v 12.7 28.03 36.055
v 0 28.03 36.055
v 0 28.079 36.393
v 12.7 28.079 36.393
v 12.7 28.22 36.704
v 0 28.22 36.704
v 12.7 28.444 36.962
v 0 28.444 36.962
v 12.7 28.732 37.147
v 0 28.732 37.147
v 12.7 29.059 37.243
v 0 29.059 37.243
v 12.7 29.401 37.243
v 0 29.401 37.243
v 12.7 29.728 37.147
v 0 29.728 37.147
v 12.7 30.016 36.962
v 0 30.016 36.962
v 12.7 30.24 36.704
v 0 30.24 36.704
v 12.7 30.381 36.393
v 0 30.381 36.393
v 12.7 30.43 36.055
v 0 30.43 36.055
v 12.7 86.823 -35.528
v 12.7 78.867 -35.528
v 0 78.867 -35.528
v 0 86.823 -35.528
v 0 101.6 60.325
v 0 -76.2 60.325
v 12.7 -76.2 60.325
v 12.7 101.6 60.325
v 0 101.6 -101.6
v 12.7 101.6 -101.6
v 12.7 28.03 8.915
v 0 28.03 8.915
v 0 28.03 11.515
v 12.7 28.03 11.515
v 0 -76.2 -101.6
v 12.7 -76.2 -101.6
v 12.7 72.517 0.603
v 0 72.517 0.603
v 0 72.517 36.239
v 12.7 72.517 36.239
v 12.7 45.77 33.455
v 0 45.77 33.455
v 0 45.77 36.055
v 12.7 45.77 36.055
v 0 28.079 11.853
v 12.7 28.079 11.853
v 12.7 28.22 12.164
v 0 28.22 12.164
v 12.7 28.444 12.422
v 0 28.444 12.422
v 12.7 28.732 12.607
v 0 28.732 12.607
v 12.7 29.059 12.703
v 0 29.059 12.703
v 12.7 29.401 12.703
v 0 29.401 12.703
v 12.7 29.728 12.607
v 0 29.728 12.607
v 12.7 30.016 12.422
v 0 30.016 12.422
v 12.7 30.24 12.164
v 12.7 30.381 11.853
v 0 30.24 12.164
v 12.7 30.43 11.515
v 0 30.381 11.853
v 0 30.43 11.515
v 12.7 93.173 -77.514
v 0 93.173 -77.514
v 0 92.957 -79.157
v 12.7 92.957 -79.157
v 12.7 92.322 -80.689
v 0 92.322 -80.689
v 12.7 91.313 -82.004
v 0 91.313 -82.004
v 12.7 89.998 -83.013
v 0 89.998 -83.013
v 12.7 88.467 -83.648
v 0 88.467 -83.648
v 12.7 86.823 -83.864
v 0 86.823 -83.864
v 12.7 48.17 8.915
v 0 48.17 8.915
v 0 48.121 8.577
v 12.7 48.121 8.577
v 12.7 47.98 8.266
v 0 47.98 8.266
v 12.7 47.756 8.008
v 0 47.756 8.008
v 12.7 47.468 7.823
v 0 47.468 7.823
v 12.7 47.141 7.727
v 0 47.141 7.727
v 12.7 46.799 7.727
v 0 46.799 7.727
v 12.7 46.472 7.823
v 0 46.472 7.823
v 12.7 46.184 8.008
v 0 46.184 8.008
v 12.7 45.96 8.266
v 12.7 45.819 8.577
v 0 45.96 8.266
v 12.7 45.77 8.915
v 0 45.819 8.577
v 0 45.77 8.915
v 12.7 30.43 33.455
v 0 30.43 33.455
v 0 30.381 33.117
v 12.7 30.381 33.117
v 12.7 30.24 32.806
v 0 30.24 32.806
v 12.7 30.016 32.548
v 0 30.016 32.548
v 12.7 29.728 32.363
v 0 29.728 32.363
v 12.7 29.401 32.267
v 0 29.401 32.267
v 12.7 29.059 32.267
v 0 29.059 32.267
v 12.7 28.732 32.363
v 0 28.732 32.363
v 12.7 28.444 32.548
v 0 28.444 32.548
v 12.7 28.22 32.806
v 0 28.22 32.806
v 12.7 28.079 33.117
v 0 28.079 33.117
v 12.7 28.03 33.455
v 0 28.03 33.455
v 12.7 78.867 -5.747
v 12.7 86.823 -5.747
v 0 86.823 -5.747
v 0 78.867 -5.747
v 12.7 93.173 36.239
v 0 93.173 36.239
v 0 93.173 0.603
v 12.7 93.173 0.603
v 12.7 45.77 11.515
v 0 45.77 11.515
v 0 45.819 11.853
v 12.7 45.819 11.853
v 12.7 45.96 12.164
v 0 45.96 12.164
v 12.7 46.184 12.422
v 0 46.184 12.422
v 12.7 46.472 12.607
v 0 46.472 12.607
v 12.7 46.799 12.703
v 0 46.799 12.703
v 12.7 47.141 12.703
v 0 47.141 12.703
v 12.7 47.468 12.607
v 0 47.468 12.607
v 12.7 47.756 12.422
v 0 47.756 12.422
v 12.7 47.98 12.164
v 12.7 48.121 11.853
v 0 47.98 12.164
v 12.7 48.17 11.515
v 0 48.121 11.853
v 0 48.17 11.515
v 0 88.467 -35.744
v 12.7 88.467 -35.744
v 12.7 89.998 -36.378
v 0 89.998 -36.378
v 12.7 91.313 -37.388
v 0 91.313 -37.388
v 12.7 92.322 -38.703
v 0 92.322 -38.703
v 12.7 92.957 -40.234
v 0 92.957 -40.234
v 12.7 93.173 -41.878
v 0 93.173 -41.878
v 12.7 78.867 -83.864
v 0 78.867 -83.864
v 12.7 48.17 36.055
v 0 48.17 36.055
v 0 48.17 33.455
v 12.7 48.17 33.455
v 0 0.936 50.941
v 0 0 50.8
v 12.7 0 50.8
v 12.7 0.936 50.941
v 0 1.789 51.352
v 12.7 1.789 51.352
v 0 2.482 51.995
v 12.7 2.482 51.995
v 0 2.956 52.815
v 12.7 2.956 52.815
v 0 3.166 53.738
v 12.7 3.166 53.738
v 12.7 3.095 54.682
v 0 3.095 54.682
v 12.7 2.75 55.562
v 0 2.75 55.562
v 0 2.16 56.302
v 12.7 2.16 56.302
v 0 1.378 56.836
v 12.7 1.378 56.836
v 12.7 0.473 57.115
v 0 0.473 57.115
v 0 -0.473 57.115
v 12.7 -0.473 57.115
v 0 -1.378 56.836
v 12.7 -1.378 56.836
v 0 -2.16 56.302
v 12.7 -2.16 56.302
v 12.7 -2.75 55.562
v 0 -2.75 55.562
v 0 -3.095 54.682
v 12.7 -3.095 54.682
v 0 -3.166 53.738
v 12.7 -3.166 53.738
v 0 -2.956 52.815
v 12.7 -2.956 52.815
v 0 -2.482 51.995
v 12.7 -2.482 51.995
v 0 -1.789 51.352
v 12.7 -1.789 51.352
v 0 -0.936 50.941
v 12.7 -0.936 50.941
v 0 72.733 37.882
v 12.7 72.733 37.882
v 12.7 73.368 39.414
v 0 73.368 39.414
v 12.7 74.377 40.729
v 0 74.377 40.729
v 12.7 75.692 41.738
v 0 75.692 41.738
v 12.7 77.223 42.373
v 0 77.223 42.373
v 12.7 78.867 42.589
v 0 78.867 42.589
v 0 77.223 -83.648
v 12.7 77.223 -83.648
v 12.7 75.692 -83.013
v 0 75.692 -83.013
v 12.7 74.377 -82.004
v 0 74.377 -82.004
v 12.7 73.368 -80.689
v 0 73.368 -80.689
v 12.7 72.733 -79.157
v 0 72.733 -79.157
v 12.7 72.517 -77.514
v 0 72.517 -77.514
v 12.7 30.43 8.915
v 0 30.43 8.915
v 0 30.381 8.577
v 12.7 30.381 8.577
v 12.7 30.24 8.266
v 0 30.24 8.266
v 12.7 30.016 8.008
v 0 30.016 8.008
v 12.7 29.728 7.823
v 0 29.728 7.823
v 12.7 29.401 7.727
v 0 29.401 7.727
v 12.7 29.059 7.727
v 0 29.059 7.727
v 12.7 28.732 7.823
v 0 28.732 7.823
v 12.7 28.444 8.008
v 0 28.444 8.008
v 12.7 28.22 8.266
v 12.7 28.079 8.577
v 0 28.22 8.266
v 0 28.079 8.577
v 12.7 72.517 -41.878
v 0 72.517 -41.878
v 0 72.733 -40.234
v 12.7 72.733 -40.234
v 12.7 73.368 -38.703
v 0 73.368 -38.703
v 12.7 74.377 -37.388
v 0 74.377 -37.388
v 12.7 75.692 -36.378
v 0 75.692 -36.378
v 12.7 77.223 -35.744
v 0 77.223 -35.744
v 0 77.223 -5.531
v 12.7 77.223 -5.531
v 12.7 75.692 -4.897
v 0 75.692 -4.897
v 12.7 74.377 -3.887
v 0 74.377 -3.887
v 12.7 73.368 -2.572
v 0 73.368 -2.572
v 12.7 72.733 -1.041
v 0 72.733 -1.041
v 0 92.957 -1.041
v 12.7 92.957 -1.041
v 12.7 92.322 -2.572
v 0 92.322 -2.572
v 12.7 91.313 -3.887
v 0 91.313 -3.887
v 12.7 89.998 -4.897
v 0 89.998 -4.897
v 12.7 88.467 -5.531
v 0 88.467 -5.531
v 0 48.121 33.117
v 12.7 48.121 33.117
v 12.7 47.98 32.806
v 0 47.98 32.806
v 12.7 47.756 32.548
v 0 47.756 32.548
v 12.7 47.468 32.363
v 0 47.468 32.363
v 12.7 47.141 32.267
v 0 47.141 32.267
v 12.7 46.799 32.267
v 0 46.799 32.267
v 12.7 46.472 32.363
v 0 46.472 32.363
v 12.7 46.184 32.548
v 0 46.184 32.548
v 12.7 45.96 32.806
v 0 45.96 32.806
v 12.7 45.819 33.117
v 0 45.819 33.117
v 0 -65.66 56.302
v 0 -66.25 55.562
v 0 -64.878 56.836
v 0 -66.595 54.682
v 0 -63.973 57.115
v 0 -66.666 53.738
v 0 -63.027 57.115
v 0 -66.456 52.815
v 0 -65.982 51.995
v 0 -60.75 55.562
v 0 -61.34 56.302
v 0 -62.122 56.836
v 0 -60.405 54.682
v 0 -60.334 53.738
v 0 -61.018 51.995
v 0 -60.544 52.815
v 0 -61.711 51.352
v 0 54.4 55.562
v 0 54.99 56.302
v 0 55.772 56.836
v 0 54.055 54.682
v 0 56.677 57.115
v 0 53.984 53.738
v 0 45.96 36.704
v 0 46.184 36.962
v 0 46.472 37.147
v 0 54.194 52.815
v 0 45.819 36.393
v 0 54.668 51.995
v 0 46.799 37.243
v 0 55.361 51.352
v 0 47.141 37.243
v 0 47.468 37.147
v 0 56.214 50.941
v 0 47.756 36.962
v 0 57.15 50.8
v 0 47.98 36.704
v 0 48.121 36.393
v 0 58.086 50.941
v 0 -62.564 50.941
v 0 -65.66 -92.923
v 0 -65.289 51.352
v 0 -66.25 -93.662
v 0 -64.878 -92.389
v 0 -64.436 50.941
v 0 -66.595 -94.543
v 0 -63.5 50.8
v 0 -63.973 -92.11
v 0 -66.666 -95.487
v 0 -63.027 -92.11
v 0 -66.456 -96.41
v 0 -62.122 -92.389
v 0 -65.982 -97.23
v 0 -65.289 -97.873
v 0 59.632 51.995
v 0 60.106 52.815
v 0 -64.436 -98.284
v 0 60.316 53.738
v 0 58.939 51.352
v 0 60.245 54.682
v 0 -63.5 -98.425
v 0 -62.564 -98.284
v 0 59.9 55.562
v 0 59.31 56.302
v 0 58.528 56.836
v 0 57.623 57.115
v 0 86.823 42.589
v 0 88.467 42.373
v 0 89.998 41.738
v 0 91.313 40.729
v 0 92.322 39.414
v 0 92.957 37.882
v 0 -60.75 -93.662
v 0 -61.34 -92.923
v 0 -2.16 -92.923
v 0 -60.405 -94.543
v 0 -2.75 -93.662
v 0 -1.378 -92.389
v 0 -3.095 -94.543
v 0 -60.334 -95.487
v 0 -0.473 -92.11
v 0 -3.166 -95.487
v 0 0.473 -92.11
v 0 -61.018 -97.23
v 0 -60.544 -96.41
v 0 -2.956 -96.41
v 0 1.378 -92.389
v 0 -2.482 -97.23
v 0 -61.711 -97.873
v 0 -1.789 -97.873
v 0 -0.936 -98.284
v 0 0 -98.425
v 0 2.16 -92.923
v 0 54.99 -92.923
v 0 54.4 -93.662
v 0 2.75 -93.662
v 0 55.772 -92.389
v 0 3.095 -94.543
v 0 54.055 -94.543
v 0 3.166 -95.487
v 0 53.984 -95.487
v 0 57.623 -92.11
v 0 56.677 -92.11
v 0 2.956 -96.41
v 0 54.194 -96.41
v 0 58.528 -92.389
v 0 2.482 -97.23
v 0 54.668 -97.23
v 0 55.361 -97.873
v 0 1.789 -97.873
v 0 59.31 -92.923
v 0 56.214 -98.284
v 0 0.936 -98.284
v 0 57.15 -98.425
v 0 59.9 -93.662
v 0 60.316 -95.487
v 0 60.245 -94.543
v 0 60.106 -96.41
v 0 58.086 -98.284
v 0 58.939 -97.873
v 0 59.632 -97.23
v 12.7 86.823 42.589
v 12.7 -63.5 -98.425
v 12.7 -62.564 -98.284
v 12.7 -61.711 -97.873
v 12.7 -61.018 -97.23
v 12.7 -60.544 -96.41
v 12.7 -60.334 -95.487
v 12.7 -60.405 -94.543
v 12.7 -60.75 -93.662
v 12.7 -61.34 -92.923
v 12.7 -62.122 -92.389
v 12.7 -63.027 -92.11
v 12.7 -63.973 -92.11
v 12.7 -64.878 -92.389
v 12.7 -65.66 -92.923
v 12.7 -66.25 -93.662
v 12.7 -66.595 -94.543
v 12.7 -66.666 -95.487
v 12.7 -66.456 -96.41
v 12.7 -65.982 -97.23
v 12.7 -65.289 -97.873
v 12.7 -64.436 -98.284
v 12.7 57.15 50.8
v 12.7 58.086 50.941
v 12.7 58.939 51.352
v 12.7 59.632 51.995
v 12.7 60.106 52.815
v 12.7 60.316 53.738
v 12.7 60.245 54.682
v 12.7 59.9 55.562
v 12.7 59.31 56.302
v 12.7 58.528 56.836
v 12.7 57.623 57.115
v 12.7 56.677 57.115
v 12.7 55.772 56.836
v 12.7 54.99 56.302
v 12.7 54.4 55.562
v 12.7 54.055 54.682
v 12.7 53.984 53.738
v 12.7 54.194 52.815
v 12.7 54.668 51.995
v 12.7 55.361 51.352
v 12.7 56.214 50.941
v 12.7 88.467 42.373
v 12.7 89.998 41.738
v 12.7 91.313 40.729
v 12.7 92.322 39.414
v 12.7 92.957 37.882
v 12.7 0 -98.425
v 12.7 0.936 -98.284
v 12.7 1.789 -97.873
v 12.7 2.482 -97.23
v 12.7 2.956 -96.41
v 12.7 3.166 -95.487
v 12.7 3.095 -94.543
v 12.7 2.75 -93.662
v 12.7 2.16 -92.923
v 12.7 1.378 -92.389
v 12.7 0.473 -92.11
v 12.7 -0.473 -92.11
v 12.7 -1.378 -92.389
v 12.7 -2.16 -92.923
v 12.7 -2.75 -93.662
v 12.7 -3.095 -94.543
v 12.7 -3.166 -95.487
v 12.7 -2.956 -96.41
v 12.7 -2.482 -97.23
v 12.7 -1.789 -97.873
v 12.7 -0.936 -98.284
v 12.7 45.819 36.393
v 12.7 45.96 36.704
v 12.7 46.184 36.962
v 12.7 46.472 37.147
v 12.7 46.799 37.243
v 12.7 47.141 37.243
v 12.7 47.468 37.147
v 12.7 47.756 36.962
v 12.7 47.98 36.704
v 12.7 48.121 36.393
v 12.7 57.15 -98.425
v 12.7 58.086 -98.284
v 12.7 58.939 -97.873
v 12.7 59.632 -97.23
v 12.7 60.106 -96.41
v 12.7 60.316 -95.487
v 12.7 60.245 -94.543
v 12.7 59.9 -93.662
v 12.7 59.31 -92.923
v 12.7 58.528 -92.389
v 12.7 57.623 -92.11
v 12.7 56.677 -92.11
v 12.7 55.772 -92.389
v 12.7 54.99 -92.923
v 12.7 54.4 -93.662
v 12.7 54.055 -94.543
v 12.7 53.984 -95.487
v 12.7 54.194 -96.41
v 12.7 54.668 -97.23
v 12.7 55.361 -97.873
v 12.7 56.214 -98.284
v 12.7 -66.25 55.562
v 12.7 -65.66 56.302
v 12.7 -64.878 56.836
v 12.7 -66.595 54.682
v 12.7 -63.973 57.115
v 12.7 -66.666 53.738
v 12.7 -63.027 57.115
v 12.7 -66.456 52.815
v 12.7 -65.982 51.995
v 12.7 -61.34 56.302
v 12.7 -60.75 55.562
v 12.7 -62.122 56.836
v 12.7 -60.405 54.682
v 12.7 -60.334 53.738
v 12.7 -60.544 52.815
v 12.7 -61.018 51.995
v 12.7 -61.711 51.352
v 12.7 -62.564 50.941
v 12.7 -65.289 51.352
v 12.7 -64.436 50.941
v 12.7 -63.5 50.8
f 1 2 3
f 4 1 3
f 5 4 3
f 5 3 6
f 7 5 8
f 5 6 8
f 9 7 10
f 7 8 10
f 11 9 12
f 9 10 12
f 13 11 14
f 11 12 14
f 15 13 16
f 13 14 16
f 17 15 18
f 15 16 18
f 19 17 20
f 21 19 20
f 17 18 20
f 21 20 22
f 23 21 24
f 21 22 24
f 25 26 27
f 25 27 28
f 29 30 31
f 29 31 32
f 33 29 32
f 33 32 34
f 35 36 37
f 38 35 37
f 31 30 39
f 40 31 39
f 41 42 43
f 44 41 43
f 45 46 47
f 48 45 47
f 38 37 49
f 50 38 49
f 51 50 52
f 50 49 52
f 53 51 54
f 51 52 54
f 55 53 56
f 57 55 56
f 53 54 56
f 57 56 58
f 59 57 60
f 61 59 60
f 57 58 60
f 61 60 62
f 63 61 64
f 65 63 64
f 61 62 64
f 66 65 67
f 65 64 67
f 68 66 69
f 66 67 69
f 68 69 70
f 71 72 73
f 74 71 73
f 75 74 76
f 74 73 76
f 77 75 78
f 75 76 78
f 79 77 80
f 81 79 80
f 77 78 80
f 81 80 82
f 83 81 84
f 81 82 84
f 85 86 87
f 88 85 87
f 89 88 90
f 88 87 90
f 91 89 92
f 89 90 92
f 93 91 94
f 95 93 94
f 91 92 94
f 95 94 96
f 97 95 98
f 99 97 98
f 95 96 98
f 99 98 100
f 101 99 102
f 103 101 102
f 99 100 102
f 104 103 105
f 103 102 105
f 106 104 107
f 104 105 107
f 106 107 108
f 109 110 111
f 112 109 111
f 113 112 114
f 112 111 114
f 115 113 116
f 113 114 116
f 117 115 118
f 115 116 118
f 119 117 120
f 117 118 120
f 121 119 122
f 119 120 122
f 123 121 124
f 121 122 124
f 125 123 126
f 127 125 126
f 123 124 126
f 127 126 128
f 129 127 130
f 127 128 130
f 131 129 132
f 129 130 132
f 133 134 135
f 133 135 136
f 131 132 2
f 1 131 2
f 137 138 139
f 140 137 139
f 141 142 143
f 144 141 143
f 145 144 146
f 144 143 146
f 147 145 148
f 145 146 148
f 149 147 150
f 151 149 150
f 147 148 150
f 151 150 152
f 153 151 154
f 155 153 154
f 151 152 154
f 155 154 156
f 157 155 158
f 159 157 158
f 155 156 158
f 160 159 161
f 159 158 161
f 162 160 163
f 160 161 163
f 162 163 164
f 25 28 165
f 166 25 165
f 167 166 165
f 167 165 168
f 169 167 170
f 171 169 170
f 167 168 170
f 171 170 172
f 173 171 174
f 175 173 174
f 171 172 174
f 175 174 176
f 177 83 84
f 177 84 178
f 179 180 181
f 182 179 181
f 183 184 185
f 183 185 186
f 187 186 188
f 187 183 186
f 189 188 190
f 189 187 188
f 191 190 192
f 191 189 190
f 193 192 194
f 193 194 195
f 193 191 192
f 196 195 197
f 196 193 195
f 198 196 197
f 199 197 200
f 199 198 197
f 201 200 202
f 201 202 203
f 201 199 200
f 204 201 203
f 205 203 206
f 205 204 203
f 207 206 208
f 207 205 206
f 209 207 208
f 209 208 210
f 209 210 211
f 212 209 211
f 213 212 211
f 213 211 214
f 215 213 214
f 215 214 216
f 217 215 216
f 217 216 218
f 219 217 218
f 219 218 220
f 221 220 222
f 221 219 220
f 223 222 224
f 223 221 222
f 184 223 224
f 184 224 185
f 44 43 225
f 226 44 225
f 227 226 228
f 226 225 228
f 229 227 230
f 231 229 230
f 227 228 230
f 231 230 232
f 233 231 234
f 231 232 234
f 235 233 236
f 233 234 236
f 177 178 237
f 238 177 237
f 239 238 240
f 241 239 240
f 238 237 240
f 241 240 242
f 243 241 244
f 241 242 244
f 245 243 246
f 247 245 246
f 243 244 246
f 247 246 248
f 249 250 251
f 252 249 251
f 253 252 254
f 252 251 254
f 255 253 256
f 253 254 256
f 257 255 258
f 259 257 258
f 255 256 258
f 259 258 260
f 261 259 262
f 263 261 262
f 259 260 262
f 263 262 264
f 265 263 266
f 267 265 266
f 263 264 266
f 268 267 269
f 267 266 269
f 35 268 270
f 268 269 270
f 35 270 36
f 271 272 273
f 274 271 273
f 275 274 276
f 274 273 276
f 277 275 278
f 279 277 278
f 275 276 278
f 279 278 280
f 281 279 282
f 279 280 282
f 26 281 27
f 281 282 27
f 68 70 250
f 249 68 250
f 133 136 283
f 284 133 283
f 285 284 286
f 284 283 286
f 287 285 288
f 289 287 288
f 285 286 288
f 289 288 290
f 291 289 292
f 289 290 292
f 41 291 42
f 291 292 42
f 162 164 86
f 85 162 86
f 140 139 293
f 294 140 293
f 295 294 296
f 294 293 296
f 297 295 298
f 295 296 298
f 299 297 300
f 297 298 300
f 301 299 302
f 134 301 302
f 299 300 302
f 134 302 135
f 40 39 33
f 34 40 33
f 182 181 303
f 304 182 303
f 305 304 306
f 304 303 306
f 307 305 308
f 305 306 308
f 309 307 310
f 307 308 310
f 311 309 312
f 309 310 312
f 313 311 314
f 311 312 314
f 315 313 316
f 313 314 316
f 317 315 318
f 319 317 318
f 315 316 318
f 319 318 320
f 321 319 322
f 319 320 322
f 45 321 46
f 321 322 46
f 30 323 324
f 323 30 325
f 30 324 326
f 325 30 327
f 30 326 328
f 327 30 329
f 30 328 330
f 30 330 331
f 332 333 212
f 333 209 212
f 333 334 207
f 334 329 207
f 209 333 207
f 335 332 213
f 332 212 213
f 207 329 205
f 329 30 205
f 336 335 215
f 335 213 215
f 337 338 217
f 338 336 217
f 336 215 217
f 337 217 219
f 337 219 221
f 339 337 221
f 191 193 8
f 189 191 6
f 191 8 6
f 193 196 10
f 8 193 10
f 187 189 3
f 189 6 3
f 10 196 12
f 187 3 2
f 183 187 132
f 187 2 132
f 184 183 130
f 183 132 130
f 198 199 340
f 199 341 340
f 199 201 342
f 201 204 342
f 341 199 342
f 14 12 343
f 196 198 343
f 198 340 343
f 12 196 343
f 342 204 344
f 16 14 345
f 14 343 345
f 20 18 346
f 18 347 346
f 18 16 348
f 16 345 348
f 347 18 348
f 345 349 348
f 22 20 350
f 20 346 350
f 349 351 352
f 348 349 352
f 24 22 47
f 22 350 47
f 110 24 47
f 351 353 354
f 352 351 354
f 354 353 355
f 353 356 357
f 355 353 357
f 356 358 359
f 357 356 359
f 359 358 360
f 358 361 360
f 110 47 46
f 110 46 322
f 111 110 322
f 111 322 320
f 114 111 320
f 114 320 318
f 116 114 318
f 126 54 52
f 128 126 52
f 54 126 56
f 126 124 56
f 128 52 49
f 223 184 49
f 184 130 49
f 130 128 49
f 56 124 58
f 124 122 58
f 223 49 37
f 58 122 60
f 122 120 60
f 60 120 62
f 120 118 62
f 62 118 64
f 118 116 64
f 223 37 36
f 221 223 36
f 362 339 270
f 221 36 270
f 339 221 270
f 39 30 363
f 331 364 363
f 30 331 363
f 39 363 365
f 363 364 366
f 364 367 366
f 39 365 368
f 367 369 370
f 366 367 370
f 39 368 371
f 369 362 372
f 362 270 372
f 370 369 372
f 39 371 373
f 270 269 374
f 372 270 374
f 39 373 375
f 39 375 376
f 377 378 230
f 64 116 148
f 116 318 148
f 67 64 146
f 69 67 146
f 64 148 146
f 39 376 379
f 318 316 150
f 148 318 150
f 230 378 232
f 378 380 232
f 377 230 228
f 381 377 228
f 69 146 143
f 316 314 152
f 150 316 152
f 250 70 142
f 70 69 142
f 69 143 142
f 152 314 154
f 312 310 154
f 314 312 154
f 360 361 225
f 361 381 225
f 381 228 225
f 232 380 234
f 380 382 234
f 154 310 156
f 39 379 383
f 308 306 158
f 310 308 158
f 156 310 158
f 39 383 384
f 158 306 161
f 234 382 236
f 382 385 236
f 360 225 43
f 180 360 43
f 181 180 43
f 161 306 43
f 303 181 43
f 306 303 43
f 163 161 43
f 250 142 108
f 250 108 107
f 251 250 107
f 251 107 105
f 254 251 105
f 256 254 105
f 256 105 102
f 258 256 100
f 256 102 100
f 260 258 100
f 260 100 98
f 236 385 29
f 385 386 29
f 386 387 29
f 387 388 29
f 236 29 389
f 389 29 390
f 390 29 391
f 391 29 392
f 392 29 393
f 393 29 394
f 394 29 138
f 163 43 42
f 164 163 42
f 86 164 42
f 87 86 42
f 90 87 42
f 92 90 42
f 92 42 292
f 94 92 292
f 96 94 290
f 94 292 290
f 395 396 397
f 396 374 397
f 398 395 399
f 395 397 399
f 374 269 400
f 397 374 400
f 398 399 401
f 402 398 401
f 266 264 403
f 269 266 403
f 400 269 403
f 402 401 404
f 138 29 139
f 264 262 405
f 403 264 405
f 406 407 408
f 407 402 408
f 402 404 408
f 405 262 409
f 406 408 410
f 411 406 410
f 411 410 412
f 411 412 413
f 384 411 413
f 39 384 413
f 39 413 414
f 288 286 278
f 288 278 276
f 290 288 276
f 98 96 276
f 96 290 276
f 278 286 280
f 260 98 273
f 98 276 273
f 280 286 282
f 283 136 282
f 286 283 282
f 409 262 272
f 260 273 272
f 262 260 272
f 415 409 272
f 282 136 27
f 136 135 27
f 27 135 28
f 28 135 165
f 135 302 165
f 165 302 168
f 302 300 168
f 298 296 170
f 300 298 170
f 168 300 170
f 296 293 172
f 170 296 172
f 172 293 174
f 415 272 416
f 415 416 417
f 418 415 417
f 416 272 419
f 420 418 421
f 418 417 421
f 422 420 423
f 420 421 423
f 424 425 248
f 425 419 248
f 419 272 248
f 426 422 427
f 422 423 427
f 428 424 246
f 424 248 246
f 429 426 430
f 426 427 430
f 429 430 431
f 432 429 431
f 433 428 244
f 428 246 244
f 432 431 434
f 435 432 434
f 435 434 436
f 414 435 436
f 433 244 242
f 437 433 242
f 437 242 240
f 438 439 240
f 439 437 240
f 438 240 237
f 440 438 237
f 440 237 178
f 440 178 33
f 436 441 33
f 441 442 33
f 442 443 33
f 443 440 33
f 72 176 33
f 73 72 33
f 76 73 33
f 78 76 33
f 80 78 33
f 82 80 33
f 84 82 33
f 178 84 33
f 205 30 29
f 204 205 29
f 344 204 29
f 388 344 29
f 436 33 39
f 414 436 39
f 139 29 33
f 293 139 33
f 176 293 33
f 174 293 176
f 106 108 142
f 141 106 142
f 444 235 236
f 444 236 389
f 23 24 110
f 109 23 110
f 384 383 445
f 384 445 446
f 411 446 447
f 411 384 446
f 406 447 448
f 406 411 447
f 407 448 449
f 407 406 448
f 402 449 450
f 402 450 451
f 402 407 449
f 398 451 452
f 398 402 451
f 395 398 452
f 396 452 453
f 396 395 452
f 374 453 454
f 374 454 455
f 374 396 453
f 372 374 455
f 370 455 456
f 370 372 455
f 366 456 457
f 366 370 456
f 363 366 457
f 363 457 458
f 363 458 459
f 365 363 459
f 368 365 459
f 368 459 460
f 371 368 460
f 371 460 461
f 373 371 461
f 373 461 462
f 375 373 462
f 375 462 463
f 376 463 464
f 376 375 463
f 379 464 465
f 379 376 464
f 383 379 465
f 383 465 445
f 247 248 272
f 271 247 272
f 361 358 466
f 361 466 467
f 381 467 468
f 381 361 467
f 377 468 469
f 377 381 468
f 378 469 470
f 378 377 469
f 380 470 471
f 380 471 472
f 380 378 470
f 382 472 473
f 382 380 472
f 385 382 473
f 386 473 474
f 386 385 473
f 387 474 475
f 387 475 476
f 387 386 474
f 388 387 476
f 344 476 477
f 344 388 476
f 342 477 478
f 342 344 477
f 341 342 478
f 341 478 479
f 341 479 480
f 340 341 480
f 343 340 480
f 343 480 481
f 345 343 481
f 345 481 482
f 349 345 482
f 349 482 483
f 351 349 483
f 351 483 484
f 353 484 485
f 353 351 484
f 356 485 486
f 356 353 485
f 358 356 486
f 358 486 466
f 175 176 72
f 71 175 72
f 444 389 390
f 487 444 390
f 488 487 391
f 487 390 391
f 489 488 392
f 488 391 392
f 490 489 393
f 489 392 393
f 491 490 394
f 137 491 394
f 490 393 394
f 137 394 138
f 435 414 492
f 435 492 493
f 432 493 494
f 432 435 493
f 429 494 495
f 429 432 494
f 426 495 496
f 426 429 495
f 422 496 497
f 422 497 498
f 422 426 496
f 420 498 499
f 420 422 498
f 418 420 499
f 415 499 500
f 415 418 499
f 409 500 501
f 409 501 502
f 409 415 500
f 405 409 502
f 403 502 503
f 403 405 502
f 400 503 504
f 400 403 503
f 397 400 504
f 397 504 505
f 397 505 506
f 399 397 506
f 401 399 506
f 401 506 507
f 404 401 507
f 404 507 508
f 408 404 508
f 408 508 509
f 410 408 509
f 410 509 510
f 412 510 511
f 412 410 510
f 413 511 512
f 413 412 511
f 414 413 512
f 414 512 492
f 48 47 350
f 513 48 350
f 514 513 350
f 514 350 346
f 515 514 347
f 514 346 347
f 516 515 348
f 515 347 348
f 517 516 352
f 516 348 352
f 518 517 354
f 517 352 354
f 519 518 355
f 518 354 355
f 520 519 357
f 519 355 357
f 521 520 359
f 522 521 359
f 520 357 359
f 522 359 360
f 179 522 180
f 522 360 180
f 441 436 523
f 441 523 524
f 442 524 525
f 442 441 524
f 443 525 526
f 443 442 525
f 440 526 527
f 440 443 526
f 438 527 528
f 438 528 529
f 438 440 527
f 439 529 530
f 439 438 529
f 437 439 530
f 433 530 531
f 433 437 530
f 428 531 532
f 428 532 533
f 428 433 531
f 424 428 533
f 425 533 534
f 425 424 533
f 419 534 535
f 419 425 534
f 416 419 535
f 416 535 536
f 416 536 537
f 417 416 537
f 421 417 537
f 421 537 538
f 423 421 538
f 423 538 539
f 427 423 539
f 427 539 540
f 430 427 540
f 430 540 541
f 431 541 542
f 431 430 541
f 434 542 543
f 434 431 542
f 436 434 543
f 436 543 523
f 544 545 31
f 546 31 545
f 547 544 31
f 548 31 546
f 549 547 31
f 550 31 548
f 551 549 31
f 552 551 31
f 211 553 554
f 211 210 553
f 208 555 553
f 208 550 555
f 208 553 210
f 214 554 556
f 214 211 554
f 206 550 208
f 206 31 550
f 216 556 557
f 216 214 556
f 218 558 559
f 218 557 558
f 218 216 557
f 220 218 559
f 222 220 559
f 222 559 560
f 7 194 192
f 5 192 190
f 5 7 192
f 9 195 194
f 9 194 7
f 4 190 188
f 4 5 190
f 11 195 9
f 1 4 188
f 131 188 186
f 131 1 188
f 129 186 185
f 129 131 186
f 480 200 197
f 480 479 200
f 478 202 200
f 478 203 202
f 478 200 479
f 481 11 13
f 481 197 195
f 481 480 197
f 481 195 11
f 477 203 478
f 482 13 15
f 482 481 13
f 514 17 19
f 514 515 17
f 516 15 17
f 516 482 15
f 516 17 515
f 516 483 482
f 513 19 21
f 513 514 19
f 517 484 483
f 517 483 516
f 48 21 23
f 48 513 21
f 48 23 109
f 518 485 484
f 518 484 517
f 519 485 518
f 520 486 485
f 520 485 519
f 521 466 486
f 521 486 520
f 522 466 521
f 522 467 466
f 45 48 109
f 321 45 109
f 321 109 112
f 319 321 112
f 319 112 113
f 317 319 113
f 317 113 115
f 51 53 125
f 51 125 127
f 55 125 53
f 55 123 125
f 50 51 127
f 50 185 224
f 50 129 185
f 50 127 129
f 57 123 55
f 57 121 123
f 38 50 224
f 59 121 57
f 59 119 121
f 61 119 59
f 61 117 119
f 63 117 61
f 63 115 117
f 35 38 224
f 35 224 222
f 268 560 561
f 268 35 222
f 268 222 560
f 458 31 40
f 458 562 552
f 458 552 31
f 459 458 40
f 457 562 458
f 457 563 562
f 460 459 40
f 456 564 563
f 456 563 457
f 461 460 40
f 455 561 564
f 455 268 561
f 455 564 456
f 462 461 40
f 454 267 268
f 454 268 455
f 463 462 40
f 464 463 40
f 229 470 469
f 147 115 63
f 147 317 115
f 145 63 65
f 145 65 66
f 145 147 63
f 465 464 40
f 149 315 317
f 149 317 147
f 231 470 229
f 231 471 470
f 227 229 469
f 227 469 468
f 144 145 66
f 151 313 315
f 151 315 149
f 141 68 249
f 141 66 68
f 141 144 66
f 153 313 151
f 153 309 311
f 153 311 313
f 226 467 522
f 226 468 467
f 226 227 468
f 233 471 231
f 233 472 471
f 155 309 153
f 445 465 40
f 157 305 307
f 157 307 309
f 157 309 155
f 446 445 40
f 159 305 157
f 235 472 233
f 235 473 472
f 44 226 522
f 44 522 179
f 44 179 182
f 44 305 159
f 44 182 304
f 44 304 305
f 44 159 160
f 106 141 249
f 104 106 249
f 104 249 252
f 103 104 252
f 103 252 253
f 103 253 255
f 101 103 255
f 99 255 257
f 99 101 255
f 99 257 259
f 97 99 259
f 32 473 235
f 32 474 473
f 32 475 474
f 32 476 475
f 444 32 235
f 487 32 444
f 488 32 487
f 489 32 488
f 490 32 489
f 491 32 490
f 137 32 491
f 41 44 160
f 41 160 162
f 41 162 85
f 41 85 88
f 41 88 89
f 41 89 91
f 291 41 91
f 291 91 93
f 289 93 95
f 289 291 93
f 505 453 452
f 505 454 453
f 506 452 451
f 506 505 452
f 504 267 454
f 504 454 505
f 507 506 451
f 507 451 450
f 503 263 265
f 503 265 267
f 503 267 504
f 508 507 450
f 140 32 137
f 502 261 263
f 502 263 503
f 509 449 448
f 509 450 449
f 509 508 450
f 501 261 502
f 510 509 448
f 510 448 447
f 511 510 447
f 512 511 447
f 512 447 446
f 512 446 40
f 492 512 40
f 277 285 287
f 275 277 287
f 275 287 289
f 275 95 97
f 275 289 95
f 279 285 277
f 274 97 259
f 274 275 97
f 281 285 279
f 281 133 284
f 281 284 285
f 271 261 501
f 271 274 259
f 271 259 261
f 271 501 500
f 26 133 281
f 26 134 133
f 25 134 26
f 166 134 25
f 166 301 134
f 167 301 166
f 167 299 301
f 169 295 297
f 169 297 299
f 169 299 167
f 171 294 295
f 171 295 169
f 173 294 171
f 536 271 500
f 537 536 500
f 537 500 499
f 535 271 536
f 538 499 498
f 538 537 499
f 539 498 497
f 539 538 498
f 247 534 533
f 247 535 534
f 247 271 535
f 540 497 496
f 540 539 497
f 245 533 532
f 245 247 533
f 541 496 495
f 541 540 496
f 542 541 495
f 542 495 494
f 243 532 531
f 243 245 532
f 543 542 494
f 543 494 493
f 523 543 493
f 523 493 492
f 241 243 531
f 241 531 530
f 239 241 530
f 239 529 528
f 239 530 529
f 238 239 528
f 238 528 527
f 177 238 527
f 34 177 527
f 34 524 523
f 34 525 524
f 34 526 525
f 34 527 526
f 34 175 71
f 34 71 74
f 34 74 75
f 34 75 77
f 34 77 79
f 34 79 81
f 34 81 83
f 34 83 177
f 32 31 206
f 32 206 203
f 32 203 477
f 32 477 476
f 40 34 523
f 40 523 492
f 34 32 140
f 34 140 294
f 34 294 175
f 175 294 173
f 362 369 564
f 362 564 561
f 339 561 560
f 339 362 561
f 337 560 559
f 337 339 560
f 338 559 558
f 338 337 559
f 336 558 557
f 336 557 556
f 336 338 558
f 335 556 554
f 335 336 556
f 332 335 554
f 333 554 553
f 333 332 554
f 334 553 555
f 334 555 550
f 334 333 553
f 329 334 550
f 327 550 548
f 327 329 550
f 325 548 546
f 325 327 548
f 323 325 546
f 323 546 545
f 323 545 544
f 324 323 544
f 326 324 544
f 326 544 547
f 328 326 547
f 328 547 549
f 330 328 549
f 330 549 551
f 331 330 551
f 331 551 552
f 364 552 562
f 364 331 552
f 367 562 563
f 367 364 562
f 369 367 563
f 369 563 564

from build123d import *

# Parameters (mm, degrees)
SKETCH1_W           = 161.925
SKETCH1_H           = 177.8
SKETCH1_R           = 3.175
BOSS_EXTRUDE1_DEPTH = 12.7


with BuildPart() as part:
    # Sketch1 → Boss-Extrude1 (new body)
    with BuildSketch(Plane(origin=(0, 0, 0), x_dir=(0, 0, -1), z_dir=(1, 0, 0))):
        with Locations((20.6375, 12.7)):
            Rectangle(SKETCH1_W, SKETCH1_H)
        with Locations((-53.975, -63.5)):
            Circle(SKETCH1_R, mode=Mode.SUBTRACT)
        with Locations((-53.975, 0)):
            Circle(SKETCH1_R, mode=Mode.SUBTRACT)
        with Locations((95.25, -63.5)):
            Circle(SKETCH1_R, mode=Mode.SUBTRACT)
        with Locations((95.25, 0)):
            Circle(SKETCH1_R, mode=Mode.SUBTRACT)
        with BuildLine():
            ThreePointArc((-33.455, 30.43), (-32.255, 29.23), (-33.455, 28.03))
            Line((-33.455, 28.03), (-36.055, 28.03))
            ThreePointArc((-36.055, 28.03), (-37.255, 29.23), (-36.055, 30.43))
            Line((-36.055, 30.43), (-33.455, 30.43))
        make_face(mode=Mode.SUBTRACT)
        with BuildLine():
            Line((-36.055, 48.17), (-33.455, 48.17))
            ThreePointArc((-33.455, 48.17), (-32.255, 46.97), (-33.455, 45.77))
            Line((-33.455, 45.77), (-36.055, 45.77))
            ThreePointArc((-36.055, 45.77), (-37.255, 46.97), (-36.055, 48.17))
        make_face(mode=Mode.SUBTRACT)
        with BuildLine():
            ThreePointArc((-8.915, 30.43), (-7.715, 29.23), (-8.915, 28.03))
            Line((-8.915, 28.03), (-11.515, 28.03))
            ThreePointArc((-11.515, 28.03), (-12.715, 29.23), (-11.515, 30.43))
            Line((-11.515, 30.43), (-8.915, 30.43))
        make_face(mode=Mode.SUBTRACT)
        with Locations((-53.975, 57.15)):
            Circle(SKETCH1_R, mode=Mode.SUBTRACT)
        with BuildLine():
            Line((-42.588896299, 78.866901715), (-42.588896299, 86.823202123))
            ThreePointArc((-42.588896299, 86.823202123), (-40.729024359, 91.313330183), (-36.238896299, 93.173202123))
            Line((-36.238896299, 93.173202123), (-0.602666303, 93.173202123))
            ThreePointArc((-0.602666303, 93.173202123), (3.887461758, 91.313330183), (5.747333697, 86.823202123))
            Line((5.747333697, 86.823202123), (5.747333697, 78.866901715))
            ThreePointArc((5.747333697, 78.866901715), (3.887461758, 74.376773654), (-0.602666303, 72.516901715))
            Line((-0.602666303, 72.516901715), (-36.238896299, 72.516901715))
            ThreePointArc((-36.238896299, 72.516901715), (-40.729024359, 74.376773654), (-42.588896299, 78.866901715))
        make_face(mode=Mode.SUBTRACT)
        with Locations((95.25, 57.15)):
            Circle(SKETCH1_R, mode=Mode.SUBTRACT)
        with BuildLine():
            ThreePointArc((41.877666303, 72.516901715), (37.387538242, 74.376773654), (35.527666303, 78.866901715))
            Line((35.527666303, 78.866901715), (35.527666303, 86.823202123))
            ThreePointArc((35.527666303, 86.823202123), (37.387538242, 91.313330183), (41.877666303, 93.173202123))
            Line((41.877666303, 93.173202123), (77.513896299, 93.173202123))
            ThreePointArc((77.513896299, 93.173202123), (82.004024359, 91.313330183), (83.863896299, 86.823202123))
            Line((83.863896299, 86.823202123), (83.863896299, 78.866901715))
            ThreePointArc((83.863896299, 78.866901715), (82.004024359, 74.376773654), (77.513896299, 72.516901715))
            Line((77.513896299, 72.516901715), (41.877666303, 72.516901715))
        make_face(mode=Mode.SUBTRACT)
        with BuildLine():
            ThreePointArc((-11.515, 45.77), (-12.715, 46.97), (-11.515, 48.17))
            Line((-11.515, 48.17), (-8.915, 48.17))
            ThreePointArc((-8.915, 48.17), (-7.715, 46.97), (-8.915, 45.77))
            Line((-8.915, 45.77), (-11.515, 45.77))
        make_face(mode=Mode.SUBTRACT)
    extrude(amount=BOSS_EXTRUDE1_DEPTH)


solid = part.part
